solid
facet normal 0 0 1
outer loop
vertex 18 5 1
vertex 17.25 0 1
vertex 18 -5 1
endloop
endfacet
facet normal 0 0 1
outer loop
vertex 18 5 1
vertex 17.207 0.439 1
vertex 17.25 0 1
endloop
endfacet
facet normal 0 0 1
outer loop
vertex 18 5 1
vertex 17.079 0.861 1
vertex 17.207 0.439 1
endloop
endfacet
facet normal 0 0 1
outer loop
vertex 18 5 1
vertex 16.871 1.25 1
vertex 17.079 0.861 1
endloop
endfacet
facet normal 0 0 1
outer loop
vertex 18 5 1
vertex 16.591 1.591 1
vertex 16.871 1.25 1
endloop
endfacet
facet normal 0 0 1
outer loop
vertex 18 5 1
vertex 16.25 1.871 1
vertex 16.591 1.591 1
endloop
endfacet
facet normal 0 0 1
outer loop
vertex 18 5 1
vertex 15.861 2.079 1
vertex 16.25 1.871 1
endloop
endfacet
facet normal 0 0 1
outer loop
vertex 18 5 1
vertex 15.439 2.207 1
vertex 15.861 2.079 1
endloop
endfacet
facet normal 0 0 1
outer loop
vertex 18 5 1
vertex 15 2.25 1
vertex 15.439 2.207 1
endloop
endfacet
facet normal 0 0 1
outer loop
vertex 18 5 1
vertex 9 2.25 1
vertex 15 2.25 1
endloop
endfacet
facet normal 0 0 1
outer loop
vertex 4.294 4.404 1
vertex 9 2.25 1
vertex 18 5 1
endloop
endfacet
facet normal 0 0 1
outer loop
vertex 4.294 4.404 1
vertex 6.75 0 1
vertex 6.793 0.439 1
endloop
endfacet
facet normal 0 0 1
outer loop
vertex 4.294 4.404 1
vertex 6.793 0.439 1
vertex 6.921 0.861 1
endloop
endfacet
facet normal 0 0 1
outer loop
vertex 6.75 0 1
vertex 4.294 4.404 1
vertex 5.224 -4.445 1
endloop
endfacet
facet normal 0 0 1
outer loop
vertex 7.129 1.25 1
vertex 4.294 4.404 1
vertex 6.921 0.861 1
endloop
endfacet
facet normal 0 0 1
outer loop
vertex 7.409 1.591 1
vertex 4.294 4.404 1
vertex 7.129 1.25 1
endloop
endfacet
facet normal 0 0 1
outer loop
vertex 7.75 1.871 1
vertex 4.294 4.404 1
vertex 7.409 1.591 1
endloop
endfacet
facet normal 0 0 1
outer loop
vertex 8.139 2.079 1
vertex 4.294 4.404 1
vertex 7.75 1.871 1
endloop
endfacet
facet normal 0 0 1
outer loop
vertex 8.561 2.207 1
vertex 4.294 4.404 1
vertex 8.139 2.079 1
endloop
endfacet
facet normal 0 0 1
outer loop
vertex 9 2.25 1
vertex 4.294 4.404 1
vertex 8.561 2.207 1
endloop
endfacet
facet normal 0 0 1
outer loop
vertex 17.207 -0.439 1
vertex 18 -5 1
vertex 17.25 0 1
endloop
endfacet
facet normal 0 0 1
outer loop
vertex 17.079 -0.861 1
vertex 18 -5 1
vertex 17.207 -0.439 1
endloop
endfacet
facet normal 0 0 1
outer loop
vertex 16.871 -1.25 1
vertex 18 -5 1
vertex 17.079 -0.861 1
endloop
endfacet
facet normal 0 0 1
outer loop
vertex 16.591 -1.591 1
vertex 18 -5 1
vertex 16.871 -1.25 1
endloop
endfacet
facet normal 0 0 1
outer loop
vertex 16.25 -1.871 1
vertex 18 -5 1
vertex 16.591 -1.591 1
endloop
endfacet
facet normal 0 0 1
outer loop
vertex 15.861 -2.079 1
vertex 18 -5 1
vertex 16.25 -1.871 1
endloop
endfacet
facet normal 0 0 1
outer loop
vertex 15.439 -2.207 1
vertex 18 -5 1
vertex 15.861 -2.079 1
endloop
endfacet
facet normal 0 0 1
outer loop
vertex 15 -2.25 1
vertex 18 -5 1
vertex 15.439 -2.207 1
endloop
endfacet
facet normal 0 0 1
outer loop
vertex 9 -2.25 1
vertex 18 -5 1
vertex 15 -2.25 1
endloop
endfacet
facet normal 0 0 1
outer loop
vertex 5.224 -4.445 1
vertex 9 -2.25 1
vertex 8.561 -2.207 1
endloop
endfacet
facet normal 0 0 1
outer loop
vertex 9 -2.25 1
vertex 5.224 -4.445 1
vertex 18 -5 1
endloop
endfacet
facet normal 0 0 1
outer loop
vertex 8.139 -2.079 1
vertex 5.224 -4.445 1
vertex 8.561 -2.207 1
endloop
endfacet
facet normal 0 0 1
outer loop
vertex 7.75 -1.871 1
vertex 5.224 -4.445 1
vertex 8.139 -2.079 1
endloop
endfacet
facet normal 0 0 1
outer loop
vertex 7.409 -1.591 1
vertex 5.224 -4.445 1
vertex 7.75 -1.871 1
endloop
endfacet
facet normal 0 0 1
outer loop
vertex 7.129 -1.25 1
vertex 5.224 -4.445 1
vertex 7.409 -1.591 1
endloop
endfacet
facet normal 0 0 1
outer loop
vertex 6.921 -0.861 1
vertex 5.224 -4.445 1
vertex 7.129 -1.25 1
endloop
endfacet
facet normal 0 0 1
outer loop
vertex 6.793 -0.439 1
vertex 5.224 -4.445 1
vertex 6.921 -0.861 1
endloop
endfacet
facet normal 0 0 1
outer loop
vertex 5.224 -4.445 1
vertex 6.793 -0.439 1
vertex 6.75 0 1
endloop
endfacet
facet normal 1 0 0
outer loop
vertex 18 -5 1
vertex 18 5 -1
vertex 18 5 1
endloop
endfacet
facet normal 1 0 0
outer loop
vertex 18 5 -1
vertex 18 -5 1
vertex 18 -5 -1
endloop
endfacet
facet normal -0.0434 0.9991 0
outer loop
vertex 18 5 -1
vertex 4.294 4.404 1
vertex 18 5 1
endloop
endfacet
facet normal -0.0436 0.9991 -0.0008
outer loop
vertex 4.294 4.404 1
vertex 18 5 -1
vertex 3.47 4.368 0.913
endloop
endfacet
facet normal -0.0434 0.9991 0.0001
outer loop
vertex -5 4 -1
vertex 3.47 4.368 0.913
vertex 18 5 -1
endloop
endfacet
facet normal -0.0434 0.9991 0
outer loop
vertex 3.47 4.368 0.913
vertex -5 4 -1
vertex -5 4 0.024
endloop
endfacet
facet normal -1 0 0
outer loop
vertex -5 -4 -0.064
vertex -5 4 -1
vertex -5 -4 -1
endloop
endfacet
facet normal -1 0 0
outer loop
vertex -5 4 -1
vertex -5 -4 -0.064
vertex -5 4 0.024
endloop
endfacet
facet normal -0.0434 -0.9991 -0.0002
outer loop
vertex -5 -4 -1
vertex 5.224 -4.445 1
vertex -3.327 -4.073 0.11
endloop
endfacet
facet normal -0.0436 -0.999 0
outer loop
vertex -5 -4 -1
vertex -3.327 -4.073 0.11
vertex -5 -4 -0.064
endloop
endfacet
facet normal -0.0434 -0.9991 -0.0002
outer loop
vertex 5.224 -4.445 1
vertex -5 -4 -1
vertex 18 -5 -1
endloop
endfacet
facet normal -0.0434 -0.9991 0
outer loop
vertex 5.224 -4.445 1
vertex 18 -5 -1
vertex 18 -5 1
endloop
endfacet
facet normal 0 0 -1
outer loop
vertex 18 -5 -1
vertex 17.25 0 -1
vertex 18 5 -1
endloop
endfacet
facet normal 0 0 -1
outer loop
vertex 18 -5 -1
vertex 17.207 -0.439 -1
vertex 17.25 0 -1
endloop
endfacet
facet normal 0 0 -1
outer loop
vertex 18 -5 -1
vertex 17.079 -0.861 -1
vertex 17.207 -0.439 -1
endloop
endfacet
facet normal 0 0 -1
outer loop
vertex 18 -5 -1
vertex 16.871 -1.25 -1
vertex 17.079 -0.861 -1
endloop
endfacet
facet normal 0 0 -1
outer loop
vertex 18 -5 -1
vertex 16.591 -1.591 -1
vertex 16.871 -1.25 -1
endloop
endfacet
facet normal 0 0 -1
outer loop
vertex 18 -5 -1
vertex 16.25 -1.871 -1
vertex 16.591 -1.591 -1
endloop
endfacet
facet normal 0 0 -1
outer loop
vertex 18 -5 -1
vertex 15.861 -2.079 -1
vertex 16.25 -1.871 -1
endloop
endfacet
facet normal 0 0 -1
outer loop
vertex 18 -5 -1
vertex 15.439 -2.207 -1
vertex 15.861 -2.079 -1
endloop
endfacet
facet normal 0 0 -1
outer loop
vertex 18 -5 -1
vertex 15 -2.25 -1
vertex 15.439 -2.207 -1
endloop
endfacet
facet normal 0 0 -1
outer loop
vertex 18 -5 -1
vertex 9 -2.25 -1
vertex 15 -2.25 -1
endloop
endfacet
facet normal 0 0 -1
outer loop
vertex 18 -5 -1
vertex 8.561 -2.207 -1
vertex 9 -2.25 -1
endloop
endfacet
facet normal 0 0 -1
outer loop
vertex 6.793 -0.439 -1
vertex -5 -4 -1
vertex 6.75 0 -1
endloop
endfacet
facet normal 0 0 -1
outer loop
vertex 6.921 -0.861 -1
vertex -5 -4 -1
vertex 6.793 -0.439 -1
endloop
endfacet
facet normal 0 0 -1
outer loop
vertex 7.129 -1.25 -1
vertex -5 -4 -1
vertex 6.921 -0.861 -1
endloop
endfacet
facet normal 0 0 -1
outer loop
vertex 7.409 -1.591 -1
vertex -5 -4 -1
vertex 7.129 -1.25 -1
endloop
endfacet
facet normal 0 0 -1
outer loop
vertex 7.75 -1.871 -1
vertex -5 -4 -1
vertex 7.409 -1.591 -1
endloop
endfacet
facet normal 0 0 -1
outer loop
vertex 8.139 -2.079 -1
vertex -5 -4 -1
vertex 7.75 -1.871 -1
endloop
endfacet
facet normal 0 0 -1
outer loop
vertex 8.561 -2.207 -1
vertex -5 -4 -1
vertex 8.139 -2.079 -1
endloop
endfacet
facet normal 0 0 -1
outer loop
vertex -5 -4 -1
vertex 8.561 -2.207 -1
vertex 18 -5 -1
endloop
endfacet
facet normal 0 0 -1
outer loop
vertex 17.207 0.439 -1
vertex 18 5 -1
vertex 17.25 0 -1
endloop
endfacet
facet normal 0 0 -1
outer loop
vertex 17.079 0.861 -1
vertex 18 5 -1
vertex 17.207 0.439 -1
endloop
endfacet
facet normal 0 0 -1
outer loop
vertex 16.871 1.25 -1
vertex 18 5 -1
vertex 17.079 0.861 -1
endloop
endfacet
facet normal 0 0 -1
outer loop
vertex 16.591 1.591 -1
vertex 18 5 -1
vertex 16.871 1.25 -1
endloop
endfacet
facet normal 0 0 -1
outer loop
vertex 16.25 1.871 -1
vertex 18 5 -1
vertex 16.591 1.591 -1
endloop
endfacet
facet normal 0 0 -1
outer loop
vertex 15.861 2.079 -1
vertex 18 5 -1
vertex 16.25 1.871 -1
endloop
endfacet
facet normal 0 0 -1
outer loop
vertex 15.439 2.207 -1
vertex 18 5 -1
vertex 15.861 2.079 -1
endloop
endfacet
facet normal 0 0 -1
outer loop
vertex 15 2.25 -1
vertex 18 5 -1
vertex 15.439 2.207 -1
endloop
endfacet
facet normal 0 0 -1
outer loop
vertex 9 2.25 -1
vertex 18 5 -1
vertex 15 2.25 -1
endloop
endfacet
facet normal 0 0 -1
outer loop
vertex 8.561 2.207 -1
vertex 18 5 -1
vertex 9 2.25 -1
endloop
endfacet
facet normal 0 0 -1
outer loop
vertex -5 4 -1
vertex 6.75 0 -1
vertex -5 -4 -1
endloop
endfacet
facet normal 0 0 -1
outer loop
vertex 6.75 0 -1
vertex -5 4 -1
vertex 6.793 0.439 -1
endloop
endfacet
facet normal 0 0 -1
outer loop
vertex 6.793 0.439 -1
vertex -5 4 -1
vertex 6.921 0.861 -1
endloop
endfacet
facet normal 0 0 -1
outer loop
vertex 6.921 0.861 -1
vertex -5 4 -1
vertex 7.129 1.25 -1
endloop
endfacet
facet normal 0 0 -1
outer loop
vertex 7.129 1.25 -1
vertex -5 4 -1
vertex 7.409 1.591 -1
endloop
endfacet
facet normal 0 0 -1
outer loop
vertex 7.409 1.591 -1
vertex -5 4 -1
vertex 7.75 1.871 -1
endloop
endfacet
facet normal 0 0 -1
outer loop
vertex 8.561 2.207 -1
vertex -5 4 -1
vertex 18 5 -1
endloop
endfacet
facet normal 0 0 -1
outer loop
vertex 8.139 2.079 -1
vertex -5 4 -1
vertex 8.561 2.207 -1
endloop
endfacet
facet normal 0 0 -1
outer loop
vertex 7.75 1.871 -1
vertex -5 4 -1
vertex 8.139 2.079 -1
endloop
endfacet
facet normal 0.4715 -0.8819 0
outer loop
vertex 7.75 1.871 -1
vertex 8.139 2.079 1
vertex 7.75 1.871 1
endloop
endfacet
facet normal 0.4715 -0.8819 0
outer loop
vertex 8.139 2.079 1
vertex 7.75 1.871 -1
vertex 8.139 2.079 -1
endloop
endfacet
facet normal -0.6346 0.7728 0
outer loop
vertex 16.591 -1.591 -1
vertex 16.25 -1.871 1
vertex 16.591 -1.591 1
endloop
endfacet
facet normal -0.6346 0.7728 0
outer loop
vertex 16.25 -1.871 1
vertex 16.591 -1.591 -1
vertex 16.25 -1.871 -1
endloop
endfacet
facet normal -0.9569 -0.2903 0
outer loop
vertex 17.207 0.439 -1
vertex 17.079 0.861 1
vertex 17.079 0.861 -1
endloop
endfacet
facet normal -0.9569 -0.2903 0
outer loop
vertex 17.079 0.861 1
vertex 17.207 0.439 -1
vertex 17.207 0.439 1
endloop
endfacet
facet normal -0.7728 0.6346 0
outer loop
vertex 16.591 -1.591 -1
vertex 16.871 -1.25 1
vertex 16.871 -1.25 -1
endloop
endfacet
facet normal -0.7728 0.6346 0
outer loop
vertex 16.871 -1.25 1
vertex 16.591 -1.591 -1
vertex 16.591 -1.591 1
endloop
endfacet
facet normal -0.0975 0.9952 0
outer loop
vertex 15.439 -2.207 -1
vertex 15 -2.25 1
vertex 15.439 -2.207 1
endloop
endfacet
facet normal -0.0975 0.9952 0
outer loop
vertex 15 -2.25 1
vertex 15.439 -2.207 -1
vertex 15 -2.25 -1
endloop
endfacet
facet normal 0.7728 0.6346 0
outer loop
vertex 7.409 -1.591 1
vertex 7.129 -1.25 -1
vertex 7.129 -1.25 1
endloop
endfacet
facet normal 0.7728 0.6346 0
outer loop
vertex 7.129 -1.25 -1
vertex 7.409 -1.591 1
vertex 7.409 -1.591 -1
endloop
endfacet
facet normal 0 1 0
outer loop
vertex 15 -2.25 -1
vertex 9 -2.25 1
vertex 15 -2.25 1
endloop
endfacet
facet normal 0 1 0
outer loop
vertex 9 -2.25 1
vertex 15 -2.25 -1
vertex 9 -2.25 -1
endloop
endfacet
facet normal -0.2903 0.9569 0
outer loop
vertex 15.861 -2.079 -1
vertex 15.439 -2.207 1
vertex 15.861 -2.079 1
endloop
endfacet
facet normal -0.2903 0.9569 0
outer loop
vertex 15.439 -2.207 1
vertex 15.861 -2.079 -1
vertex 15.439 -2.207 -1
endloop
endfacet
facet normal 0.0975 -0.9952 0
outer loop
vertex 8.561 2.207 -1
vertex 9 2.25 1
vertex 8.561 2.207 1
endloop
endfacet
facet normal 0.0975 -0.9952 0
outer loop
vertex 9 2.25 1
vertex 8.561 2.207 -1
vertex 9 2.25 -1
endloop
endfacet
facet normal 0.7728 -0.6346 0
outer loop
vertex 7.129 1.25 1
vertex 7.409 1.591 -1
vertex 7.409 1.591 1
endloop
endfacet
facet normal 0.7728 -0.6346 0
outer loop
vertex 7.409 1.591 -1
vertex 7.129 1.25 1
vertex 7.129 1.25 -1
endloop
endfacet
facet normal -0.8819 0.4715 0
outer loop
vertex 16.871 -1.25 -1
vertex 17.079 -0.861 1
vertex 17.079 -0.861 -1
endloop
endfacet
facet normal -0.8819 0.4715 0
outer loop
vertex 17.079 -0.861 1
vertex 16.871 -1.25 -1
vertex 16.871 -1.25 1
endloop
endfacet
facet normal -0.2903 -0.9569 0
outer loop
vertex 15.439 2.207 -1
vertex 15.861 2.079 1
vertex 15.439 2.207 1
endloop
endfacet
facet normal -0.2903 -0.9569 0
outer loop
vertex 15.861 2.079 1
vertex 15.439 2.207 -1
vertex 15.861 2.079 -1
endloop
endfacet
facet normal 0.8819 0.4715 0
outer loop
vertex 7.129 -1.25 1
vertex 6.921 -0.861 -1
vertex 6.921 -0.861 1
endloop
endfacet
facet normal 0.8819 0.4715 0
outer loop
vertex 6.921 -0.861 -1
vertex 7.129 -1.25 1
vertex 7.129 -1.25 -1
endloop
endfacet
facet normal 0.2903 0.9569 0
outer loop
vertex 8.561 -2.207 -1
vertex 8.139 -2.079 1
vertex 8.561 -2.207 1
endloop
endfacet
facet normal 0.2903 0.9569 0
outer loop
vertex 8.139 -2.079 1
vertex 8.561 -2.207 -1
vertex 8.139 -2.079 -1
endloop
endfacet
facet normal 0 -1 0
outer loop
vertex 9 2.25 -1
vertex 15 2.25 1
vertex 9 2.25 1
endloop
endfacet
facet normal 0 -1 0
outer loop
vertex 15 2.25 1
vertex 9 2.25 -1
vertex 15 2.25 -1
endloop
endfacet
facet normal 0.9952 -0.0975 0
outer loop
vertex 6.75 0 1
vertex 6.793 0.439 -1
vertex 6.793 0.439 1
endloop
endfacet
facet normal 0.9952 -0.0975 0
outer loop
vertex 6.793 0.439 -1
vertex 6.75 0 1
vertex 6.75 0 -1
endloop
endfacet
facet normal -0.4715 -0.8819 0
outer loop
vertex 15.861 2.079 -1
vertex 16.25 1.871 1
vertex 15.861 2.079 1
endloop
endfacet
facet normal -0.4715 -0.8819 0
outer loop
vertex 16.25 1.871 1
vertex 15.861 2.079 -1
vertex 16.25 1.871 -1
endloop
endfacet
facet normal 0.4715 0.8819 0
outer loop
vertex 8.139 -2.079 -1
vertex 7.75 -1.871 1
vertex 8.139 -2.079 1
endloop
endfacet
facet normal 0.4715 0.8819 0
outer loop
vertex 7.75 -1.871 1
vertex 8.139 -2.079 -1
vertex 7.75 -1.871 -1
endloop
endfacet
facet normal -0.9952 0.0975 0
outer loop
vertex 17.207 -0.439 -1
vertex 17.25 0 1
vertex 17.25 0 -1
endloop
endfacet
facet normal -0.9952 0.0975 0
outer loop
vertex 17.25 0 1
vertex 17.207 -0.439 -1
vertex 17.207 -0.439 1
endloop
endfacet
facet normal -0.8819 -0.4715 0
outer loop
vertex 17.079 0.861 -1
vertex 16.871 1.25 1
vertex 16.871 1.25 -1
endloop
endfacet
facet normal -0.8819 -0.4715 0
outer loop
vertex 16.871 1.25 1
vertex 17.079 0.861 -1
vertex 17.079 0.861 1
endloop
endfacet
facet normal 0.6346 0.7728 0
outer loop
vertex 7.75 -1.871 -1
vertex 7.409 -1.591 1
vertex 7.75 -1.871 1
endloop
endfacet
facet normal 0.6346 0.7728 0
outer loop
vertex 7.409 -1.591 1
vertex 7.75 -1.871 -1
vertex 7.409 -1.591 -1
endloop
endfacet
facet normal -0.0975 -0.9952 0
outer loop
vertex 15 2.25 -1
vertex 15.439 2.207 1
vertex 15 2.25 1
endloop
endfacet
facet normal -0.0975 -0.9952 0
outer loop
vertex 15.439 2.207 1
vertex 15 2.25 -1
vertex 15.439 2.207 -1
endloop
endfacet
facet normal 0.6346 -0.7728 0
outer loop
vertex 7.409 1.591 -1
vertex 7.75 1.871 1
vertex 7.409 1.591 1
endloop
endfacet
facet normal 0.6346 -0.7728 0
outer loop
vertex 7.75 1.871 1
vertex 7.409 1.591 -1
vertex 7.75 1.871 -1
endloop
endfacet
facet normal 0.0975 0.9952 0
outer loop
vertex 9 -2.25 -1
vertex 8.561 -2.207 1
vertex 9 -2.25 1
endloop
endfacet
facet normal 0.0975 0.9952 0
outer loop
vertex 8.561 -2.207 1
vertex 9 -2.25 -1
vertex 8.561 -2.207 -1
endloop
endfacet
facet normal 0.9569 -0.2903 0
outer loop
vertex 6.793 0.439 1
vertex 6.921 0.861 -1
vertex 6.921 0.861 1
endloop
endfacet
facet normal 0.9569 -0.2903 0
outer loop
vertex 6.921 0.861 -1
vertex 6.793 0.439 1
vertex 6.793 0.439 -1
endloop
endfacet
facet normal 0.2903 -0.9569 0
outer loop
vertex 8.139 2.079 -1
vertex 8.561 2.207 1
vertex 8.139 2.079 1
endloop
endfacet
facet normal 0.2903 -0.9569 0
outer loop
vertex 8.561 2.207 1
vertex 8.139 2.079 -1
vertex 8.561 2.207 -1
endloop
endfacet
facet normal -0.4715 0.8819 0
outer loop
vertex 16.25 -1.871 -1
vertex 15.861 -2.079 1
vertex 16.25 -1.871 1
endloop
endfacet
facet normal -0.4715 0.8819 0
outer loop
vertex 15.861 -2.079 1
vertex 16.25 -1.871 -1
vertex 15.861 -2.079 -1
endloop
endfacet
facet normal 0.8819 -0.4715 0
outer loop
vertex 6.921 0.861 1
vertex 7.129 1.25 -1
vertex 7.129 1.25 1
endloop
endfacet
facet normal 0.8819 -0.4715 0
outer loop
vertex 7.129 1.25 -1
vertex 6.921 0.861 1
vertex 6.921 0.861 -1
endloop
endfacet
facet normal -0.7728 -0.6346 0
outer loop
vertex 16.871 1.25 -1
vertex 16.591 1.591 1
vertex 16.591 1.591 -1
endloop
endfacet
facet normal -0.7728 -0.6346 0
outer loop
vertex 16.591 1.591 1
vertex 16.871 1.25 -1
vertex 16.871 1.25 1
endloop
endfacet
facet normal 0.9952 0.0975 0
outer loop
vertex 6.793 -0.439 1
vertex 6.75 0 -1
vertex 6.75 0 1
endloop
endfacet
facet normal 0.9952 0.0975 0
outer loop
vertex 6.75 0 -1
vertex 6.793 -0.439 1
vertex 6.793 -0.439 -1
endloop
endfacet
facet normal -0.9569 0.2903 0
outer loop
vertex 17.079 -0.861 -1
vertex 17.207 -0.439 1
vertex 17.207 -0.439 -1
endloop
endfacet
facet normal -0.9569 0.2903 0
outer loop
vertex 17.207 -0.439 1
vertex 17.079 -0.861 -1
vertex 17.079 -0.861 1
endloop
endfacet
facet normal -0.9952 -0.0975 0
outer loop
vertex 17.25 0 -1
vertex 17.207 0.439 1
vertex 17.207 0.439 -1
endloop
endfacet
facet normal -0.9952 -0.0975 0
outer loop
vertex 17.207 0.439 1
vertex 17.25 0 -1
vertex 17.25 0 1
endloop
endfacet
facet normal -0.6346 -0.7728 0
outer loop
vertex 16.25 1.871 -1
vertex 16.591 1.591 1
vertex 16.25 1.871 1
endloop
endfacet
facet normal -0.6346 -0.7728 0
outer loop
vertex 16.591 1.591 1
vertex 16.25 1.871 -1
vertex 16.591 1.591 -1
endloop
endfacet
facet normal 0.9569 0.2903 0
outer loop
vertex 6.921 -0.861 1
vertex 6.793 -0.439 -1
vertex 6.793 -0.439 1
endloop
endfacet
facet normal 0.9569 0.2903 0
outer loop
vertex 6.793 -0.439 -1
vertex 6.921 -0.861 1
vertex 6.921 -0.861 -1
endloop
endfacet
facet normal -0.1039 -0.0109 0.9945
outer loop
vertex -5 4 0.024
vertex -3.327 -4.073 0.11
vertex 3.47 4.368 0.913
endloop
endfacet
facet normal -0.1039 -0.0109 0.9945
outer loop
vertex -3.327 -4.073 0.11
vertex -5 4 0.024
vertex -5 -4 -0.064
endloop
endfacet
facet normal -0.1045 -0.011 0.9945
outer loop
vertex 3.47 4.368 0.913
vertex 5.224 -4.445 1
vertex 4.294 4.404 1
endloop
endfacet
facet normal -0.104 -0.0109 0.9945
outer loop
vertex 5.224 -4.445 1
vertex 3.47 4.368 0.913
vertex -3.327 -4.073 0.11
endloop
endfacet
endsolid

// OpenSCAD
//Scraper to keep idler wheels clear

module scraper() {
    difference() {
        translate([0, 0, -1]) linear_extrude(height=2) polygon([
            [-5, 4],
            [18, 5],
            [18, -5],
            [-5, -4]
        ]);
        translate([9, 0, 0]) hull() {
            cylinder(h=10, d=4.5, $fn=32, center=true);
            translate([6, 0, 0]) cylinder(h=10, d=4.5, $fn=32, center=true);
        }
        rotate([0, 6, -6]) translate([0, 0, -15.5]) cube(30, center=true);
    }
}

rotate([180, 0, 0]) scraper();
